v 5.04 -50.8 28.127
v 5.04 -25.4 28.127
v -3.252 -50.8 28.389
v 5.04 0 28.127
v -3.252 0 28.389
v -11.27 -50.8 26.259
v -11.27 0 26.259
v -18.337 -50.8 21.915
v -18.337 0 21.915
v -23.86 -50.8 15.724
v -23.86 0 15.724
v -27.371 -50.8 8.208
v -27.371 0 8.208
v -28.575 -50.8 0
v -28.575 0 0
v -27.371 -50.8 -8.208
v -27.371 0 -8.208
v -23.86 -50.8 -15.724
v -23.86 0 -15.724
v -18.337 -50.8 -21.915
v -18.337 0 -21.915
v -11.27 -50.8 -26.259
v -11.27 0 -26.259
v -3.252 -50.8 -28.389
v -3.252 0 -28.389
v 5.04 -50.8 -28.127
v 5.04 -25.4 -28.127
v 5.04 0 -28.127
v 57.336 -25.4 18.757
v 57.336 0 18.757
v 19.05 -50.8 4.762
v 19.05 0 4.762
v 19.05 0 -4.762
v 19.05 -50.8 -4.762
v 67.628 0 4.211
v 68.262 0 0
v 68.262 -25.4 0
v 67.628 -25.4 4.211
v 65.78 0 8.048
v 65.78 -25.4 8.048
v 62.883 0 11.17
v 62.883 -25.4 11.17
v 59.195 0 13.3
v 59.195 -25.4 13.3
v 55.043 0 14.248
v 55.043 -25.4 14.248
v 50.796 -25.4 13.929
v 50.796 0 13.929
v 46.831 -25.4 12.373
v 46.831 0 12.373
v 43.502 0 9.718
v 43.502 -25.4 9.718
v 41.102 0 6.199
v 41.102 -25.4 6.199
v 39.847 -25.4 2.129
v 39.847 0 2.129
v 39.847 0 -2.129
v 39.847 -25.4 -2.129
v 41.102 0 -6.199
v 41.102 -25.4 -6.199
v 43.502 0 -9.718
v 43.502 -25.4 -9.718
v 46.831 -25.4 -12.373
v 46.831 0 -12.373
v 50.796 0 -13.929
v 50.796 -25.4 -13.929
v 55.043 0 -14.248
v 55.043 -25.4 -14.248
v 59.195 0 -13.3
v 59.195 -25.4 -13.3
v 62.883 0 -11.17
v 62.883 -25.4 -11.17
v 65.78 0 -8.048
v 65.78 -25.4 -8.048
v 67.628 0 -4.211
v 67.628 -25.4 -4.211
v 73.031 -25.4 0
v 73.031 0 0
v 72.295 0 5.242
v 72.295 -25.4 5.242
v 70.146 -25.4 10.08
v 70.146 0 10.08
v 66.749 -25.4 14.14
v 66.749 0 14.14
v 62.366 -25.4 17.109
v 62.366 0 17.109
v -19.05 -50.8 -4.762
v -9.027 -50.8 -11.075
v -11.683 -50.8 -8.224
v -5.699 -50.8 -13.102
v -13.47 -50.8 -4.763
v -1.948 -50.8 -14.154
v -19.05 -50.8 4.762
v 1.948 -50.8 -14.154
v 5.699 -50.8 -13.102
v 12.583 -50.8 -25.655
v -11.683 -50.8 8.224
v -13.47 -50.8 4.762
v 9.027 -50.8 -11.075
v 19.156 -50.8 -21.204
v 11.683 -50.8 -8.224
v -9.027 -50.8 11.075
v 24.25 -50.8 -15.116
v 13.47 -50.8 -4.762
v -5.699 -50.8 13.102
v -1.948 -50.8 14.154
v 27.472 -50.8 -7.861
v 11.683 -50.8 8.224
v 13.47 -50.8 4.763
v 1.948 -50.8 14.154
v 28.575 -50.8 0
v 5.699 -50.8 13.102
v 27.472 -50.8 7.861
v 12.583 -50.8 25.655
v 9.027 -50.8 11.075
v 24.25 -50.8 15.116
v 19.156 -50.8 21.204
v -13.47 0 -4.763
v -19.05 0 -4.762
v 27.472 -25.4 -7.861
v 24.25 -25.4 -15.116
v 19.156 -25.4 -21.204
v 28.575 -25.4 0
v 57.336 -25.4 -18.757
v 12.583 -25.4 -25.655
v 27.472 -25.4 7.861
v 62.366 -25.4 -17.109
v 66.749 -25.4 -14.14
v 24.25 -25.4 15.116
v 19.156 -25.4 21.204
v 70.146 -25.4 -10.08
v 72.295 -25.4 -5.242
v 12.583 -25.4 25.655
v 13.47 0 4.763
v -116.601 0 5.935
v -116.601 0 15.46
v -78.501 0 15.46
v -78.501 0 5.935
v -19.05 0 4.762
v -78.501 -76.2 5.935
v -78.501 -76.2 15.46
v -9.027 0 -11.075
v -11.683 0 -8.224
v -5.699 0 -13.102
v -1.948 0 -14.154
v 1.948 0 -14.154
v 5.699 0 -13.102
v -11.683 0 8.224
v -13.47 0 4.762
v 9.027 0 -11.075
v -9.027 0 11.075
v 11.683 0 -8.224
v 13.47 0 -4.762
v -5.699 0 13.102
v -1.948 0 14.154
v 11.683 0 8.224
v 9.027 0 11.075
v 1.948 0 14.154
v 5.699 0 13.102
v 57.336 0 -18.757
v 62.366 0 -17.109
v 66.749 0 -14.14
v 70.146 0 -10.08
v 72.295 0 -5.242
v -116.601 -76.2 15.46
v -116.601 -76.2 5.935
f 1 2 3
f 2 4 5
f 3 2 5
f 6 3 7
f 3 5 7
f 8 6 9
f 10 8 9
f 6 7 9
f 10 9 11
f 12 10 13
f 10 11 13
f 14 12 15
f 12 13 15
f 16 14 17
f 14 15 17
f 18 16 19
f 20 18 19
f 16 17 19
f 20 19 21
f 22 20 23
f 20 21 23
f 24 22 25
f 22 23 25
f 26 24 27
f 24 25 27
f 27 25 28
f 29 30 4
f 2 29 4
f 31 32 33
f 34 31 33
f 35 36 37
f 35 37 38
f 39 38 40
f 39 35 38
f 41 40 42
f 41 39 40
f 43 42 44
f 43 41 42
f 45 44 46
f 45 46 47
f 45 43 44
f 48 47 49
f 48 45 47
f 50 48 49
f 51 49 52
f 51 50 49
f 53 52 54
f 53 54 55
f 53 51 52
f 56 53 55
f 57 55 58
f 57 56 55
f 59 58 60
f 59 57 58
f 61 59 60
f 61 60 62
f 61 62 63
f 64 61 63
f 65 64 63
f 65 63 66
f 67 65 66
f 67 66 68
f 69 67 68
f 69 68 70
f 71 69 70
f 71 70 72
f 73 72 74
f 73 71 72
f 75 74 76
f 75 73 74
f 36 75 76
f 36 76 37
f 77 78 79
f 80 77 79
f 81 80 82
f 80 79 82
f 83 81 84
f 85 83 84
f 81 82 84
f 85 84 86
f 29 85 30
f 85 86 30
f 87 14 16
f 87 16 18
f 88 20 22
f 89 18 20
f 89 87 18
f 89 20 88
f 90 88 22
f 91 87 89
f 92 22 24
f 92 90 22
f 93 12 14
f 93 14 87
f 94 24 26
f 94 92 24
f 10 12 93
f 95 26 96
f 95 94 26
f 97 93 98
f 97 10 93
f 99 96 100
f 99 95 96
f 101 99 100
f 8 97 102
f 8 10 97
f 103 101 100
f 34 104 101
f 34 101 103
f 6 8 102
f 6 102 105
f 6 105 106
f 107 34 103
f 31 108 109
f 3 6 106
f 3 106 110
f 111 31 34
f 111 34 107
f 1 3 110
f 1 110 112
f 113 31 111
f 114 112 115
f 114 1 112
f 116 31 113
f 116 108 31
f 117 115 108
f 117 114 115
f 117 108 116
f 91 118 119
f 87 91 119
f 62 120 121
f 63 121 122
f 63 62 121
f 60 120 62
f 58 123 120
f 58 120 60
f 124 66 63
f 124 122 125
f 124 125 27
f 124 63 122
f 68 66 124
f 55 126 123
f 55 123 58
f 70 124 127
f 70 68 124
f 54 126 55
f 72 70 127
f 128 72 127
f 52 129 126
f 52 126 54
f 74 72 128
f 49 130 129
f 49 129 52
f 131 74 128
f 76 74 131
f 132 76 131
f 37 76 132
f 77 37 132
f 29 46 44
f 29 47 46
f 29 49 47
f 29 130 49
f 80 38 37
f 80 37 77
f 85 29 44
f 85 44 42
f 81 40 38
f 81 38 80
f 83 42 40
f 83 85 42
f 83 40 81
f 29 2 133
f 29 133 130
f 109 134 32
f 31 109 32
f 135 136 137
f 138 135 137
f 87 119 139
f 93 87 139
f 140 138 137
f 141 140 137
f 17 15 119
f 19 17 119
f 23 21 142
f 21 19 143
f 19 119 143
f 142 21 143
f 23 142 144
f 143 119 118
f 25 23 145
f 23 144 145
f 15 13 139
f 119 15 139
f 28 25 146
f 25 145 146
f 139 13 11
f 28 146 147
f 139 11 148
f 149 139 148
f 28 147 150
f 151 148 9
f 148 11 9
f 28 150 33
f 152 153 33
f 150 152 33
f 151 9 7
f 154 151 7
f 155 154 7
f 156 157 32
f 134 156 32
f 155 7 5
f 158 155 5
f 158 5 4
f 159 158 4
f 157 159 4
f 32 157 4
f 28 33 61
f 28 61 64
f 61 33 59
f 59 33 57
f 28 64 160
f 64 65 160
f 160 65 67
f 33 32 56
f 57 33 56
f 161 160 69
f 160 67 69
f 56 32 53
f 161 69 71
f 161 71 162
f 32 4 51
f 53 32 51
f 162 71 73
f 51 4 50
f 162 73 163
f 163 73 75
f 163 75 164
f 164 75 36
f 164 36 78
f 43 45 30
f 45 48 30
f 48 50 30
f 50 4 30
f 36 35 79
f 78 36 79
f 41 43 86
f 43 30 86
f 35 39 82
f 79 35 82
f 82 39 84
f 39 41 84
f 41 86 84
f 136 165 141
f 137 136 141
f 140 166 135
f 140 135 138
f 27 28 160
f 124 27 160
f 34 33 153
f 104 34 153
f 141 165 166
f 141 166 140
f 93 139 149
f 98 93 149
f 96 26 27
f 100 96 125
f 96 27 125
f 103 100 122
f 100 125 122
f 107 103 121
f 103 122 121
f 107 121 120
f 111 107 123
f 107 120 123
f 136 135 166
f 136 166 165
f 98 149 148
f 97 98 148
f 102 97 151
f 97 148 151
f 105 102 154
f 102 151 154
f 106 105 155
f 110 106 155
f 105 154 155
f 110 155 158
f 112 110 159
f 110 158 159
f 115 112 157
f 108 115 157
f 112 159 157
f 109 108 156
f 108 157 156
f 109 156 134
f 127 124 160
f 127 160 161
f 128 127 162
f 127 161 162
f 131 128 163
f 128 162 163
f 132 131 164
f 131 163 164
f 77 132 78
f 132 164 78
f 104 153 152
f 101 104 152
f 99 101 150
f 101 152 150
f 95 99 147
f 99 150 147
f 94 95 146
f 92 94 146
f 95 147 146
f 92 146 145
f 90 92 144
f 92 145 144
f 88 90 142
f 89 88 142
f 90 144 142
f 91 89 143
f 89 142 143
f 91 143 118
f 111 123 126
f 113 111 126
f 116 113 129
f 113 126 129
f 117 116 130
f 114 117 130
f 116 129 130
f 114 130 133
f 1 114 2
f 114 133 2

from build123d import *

# Parameters (mm, degrees)
F0_R     = 14.2875
F1_DEPTH = 25.4
F2_DEPTH = 50.8
F3_W     = 38.1
F3_H     = 9.525
F4_DEPTH = 76.2


with BuildPart() as f1:
    # F0 (on Front) → F1 (new body)
    with BuildSketch(Plane.XZ):
        with BuildLine():
            ThreePointArc((5.039615, -28.127085), (21.915036, -18.337443), (28.575, 0))
            ThreePointArc((28.575, 0), (21.915036, 18.337443), (5.039615, 28.127085))
            ThreePointArc((5.039615, 28.127085), (-28.575, 0), (5.039615, -28.127085))
        make_face()
        with BuildLine():
            ThreePointArc((-13.470384, 4.7625), (0, 14.2875), (13.470384, 4.7625))
            Line((13.470384, 4.7625), (19.05, 4.7625))
            Line((19.05, 4.7625), (19.05, -4.7625))
            Line((19.05, -4.7625), (13.470384, -4.7625))
            ThreePointArc((13.470384, -4.7625), (0, -14.2875), (-13.470384, -4.7625))
            Line((-13.470384, -4.7625), (-19.05, -4.7625))
            Line((-19.05, -4.7625), (-19.05, 4.7625))
            Line((-19.05, 4.7625), (-13.470384, 4.7625))
        make_face(mode=Mode.SUBTRACT)
        with BuildLine():
            ThreePointArc((5.039615, 28.127085), (21.915036, 18.337443), (28.575, 0))
            ThreePointArc((28.575, 0), (21.915036, -18.337443), (5.039615, -28.127085))
            Line((5.039615, -28.127085), (57.335753, -18.757027))
            ThreePointArc((57.335753, -18.757027), (34.919273, 0), (57.335753, 18.757027))
            Line((57.335753, 18.757027), (5.039615, 28.127085))
        make_face()
        with BuildLine():
            ThreePointArc((73.030727, 0), (68.589417, 12.228637), (57.335753, 18.757027))
            ThreePointArc((57.335753, 18.757027), (34.919273, 0), (57.335753, -18.757027))
            ThreePointArc((57.335753, -18.757027), (68.589417, -12.228637), (73.030727, 0))
        make_face()
        with Locations((53.975, 0)):
            Circle(F0_R, mode=Mode.SUBTRACT)
    extrude(amount=F1_DEPTH)

    # F0 (on Front) → F2 (join)
    with BuildSketch(Plane.XZ):
        with BuildLine():
            ThreePointArc((5.039615, -28.127085), (21.915036, -18.337443), (28.575, 0))
            ThreePointArc((28.575, 0), (21.915036, 18.337443), (5.039615, 28.127085))
            ThreePointArc((5.039615, 28.127085), (-28.575, 0), (5.039615, -28.127085))
        make_face()
        with BuildLine():
            ThreePointArc((-13.470384, 4.7625), (0, 14.2875), (13.470384, 4.7625))
            Line((13.470384, 4.7625), (19.05, 4.7625))
            Line((19.05, 4.7625), (19.05, -4.7625))
            Line((19.05, -4.7625), (13.470384, -4.7625))
            ThreePointArc((13.470384, -4.7625), (0, -14.2875), (-13.470384, -4.7625))
            Line((-13.470384, -4.7625), (-19.05, -4.7625))
            Line((-19.05, -4.7625), (-19.05, 4.7625))
            Line((-19.05, 4.7625), (-13.470384, 4.7625))
        make_face(mode=Mode.SUBTRACT)
    extrude(amount=F2_DEPTH)


with BuildPart() as f4:
    # F3 (on Front) → F4 (new body)
    with BuildSketch(Plane.XZ):
        with Locations((-97.551199, 10.697308)):
            Rectangle(F3_W, F3_H)
    extrude(amount=F4_DEPTH)


solid = Compound([f1.part, f4.part])
